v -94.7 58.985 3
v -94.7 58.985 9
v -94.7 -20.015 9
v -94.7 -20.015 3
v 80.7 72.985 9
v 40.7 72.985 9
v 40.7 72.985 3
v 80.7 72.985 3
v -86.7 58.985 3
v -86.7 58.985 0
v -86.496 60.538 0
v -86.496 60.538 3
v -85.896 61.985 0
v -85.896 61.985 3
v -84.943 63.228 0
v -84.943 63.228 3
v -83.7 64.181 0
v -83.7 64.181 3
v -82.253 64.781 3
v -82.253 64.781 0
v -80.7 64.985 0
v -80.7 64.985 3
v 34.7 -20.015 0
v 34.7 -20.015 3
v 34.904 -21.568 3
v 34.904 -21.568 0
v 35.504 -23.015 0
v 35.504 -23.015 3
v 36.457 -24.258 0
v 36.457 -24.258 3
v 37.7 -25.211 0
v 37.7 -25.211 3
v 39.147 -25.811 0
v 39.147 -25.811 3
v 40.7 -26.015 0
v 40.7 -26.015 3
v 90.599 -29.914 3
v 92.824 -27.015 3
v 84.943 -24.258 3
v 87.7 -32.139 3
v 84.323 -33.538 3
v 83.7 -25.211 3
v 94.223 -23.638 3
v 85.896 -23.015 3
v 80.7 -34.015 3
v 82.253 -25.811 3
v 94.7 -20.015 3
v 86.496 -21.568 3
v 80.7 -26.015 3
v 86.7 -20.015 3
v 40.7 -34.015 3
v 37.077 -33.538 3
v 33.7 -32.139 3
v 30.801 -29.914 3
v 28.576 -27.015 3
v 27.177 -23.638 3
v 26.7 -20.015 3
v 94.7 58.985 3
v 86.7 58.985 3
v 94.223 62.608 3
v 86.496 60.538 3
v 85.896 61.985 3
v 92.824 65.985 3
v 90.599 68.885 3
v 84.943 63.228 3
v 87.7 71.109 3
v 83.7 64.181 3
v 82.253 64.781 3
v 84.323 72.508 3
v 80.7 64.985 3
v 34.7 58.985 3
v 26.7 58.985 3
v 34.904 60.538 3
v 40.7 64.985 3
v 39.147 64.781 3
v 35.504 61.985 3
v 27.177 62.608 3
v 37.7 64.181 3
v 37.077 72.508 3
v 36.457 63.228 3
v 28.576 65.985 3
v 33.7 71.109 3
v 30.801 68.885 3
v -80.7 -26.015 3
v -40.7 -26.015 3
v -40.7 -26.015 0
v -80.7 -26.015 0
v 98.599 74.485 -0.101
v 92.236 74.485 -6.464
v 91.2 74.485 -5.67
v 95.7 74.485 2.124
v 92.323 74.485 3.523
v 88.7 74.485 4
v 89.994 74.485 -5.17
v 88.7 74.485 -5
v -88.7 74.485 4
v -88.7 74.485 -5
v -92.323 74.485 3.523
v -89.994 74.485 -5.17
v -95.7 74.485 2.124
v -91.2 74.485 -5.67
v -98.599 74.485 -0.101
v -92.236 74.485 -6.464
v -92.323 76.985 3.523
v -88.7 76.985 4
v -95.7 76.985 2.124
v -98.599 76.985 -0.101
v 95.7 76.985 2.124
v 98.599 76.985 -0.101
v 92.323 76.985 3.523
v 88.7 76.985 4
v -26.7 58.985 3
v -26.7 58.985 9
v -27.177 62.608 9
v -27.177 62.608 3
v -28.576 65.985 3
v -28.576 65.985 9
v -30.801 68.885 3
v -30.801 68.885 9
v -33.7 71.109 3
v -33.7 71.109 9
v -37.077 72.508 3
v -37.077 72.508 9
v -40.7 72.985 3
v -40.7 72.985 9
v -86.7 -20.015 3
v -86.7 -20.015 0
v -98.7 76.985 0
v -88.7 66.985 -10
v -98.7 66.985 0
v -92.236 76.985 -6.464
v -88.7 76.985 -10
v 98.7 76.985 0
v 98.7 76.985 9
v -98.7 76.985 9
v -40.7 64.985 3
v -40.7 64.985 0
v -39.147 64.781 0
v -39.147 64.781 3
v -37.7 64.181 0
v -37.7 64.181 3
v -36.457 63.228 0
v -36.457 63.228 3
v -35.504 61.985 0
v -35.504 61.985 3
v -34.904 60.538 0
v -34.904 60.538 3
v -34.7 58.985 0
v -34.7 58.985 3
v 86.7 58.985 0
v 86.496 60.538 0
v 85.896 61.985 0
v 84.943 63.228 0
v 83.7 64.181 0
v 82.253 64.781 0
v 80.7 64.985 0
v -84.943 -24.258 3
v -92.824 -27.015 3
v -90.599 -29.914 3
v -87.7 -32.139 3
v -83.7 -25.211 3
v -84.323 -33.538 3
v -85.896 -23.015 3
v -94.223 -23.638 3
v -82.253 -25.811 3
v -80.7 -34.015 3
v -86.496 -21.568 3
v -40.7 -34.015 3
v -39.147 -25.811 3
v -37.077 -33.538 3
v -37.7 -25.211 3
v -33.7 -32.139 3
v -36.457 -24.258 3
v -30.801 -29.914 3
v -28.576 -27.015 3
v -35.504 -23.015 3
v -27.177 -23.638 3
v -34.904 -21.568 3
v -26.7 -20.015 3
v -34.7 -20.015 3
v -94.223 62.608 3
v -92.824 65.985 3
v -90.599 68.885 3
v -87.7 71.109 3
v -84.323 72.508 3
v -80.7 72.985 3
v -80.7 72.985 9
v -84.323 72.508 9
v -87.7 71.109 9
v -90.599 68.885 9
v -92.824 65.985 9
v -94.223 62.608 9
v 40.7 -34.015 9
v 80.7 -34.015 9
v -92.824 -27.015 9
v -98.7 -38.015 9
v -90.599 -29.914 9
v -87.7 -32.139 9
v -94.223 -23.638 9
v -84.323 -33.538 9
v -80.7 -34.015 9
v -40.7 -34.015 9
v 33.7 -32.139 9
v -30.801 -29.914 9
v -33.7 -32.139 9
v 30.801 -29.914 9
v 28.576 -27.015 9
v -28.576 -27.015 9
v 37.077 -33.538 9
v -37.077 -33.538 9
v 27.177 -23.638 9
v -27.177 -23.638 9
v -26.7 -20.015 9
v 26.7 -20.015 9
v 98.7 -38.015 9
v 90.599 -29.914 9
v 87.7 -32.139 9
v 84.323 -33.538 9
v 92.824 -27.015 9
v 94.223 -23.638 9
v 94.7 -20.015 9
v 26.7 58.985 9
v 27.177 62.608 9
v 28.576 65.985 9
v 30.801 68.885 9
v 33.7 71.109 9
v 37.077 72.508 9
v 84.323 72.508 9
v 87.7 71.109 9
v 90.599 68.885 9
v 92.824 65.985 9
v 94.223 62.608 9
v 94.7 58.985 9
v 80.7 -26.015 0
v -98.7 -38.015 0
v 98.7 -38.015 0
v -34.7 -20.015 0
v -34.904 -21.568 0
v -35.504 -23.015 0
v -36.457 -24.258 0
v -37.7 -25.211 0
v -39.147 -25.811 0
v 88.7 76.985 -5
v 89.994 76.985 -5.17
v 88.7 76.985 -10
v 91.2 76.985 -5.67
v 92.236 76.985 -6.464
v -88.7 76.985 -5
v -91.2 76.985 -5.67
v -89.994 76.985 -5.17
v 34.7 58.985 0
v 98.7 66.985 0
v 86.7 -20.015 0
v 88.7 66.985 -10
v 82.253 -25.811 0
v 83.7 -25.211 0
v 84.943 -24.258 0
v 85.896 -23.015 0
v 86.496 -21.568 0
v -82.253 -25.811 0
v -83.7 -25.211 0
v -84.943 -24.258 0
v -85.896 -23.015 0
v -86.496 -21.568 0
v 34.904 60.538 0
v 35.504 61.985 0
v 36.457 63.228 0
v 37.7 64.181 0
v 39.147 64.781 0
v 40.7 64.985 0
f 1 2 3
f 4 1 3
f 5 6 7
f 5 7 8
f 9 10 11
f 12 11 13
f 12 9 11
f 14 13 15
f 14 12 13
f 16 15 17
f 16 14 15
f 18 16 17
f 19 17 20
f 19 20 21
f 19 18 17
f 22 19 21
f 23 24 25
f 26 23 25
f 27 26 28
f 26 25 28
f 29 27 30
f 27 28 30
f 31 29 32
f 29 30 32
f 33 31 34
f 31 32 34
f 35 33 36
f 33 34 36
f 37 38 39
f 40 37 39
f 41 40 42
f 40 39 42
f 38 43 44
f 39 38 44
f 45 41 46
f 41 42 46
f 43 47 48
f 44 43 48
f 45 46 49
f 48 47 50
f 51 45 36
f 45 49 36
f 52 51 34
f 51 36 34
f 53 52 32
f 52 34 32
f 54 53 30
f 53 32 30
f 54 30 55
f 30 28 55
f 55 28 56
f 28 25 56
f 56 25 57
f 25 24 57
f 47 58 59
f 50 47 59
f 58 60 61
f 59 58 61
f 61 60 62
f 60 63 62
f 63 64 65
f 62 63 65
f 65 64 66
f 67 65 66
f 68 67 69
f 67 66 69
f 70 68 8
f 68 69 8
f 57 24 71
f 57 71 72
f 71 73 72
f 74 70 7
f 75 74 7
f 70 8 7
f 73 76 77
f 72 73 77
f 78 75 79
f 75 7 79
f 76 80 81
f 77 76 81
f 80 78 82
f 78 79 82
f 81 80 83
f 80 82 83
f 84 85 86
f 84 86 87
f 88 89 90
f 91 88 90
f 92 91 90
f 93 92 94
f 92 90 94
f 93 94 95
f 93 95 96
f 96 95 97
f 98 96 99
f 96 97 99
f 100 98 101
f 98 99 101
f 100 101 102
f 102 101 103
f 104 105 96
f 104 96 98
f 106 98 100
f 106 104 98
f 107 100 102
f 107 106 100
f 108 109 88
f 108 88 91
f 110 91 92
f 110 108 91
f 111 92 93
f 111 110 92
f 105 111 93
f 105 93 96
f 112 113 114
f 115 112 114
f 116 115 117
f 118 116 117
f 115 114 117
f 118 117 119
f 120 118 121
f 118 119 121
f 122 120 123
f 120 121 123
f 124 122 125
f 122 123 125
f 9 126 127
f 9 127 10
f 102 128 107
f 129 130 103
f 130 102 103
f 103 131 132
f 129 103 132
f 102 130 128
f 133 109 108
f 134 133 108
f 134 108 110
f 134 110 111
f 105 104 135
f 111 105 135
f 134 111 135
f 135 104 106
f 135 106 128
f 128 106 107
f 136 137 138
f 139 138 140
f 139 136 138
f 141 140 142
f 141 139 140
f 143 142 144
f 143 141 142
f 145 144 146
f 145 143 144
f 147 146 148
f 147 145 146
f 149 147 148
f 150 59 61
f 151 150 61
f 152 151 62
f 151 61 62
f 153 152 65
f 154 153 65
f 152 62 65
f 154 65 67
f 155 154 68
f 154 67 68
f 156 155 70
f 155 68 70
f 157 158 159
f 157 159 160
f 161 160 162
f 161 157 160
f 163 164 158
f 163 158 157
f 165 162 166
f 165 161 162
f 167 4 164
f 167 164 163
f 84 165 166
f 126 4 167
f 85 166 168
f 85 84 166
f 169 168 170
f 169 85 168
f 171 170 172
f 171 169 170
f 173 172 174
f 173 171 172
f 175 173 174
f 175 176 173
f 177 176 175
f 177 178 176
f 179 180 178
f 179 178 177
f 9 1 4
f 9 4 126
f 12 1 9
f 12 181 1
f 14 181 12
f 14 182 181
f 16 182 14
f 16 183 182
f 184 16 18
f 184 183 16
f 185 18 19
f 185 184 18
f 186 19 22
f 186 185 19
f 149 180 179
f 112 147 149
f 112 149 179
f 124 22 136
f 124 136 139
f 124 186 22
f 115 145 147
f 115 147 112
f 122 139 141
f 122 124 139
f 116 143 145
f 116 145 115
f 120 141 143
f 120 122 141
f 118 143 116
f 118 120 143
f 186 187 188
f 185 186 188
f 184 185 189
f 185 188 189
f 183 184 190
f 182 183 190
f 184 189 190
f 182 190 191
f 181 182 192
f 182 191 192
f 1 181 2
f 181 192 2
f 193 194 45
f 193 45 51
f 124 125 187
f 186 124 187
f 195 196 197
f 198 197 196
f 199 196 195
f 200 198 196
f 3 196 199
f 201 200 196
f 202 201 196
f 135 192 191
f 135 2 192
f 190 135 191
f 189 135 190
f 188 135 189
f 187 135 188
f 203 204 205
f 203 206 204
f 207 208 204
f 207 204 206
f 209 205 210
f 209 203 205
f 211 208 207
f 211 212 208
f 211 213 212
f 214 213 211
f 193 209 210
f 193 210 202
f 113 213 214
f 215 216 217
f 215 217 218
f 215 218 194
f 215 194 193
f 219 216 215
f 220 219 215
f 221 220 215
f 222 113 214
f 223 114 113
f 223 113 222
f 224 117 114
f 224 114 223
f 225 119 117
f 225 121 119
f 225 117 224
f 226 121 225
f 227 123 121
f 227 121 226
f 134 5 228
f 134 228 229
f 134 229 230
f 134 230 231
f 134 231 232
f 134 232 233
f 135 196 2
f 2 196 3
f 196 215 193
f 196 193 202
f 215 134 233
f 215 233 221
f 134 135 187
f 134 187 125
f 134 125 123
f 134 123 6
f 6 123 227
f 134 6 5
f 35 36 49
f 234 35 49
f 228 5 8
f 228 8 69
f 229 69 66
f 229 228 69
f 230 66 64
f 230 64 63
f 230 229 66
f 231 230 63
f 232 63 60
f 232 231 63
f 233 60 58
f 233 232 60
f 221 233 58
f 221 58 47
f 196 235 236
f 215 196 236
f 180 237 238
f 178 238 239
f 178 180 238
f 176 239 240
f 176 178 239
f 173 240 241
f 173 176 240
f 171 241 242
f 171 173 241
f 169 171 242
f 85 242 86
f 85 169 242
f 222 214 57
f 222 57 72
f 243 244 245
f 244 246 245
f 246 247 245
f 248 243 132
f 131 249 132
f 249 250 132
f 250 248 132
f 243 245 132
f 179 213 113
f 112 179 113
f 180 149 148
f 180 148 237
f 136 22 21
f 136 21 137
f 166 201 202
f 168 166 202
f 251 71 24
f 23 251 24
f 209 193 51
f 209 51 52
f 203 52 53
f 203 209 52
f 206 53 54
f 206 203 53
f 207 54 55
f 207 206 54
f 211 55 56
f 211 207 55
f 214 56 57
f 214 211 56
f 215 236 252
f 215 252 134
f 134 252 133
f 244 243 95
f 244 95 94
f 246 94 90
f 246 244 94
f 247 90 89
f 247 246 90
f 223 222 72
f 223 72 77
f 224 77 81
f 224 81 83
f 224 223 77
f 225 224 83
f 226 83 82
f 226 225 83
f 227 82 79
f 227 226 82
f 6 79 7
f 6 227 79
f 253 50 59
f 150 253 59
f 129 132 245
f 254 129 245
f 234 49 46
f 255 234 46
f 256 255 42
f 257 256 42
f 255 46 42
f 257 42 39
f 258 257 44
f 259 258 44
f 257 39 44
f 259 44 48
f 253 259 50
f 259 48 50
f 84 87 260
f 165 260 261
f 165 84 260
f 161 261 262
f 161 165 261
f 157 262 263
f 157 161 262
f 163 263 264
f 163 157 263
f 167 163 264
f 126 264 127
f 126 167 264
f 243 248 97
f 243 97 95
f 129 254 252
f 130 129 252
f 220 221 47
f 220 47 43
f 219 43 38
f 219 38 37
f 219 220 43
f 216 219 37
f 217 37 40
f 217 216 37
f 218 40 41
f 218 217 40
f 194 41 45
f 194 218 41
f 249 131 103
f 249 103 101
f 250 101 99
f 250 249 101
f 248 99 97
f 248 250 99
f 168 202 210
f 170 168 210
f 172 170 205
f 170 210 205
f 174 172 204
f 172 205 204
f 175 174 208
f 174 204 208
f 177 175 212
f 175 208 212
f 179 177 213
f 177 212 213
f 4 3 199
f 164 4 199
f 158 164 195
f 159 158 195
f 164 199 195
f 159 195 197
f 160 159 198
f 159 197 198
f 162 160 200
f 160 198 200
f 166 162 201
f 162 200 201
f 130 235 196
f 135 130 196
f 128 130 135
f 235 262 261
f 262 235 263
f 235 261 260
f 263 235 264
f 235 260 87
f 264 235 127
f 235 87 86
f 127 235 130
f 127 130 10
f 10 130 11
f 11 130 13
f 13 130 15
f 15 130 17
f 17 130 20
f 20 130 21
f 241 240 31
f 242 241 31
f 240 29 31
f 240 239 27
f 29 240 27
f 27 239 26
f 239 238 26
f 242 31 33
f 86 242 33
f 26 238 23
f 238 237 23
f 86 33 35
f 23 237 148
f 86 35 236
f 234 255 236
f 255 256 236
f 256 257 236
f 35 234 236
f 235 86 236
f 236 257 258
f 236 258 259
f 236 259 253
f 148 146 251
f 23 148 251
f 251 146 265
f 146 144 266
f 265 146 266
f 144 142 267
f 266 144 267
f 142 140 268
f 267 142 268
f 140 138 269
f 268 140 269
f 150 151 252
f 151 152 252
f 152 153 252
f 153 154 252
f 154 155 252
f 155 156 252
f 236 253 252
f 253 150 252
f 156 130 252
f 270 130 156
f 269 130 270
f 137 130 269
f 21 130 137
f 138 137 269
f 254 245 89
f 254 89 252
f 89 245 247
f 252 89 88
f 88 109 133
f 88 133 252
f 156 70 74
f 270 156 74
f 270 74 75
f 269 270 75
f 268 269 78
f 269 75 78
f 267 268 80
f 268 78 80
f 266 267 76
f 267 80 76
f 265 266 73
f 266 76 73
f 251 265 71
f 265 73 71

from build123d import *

# Parameters (mm, degrees)
SKETCH1_W           = 197.4
SKETCH1_H           = 115
BOSS_EXTRUDE1_DEPTH = 9
BOSS_EXTRUDE2_DEPTH = 10
CUT_EXTRUDE1_DEPTH  = 9
CUT_EXTRUDE2_DEPTH  = 6
CUT_EXTRUDE3_DEPTH  = 2.5


with BuildPart() as part:
    # Sketch1 → Boss-Extrude1 (new body)
    with BuildSketch(Plane.XY):
        with Locations((0, 19.485033023)):
            Rectangle(SKETCH1_W, SKETCH1_H)
    extrude(amount=BOSS_EXTRUDE1_DEPTH)

    # Sketch2 → Boss-Extrude2 (add)
    with BuildSketch(Plane(origin=(0, 76.985033023, 0), x_dir=(1, 0, 0), z_dir=(0, 1, 0))):
        Polygon((-88.7, 10), (88.7, 10), (98.7, 0), (-98.7, 0), align=None)
    extrude(amount=-BOSS_EXTRUDE2_DEPTH)

    # Sketch3 → Cut-Extrude1 (cut)
    with BuildSketch(Plane.XY.offset(9)):
        with BuildLine():
            Line((-80.7, 64.985033023), (-40.7, 64.985033023))
            ThreePointArc((-40.7, 64.985033023), (-36.457359313, 63.22767371), (-34.7, 58.985033023))
            Line((-34.7, 58.985033023), (-34.7, -20.014966977))
            ThreePointArc((-34.7, -20.014966977), (-36.457359313, -24.257607664), (-40.7, -26.014966977))
            Line((-40.7, -26.014966977), (-80.7, -26.014966977))
            ThreePointArc((-80.7, -26.014966977), (-84.942640687, -24.257607664), (-86.7, -20.014966977))
            Line((-86.7, -20.014966977), (-86.7, 58.985033023))
            ThreePointArc((-86.7, 58.985033023), (-84.942640687, 63.22767371), (-80.7, 64.985033023))
        make_face()
    cut_extrude1 = extrude(amount=-CUT_EXTRUDE1_DEPTH, mode=Mode.SUBTRACT)

    # Sketch4 → Cut-Extrude2 (cut)
    with BuildSketch(Plane.XY.offset(9)):
        with BuildLine():
            Line((-94.7, 58.985033023), (-94.7, -20.014966977))
            ThreePointArc((-94.7, -20.014966977), (-90.599494937, -29.914461914), (-80.7, -34.014966977))
            Line((-80.7, -34.014966977), (-40.7, -34.014966977))
            ThreePointArc((-40.7, -34.014966977), (-30.800505063, -29.914461914), (-26.7, -20.014966977))
            Line((-26.7, -20.014966977), (-26.7, 58.985033023))
            ThreePointArc((-26.7, 58.985033023), (-30.800505063, 68.88452796), (-40.7, 72.985033023))
            Line((-40.7, 72.985033023), (-80.7, 72.985033023))
            ThreePointArc((-80.7, 72.985033023), (-90.599494937, 68.88452796), (-94.7, 58.985033023))
        make_face()
    cut_extrude2 = extrude(amount=-CUT_EXTRUDE2_DEPTH, mode=Mode.SUBTRACT)

    # Mirror1: Cut-Extrude1, Cut-Extrude2 across plane
    add(cut_extrude1.mirror(Plane(origin=(0, 0, 0), x_dir=(0, 0, 1), z_dir=(1, 0, 0))), mode=Mode.SUBTRACT)
    add(cut_extrude2.mirror(Plane(origin=(0, 0, 0), x_dir=(0, 0, 1), z_dir=(1, 0, 0))), mode=Mode.SUBTRACT)

    # Sketch5 → Cut-Extrude3 (cut)
    with BuildSketch(Plane(origin=(0, 76.985033023, 0), x_dir=(1, 0, 0), z_dir=(0, 1, 0))):
        with BuildLine():
            Line((-88.7, 5), (88.7, 5))
            ThreePointArc((88.7, 5), (90.613417162, 5.380602337), (92.235533906, 6.464466094))
            Line((92.235533906, 6.464466094), (98.599494937, 0.100505063))
            ThreePointArc((98.599494937, 0.100505063), (94.057568053, -2.934313455), (88.7, -4))
            Line((88.7, -4), (-88.7, -4))
            ThreePointArc((-88.7, -4), (-94.057568053, -2.934313455), (-98.599494937, 0.100505063))
            Line((-98.599494937, 0.100505063), (-92.235533906, 6.464466094))
            ThreePointArc((-92.235533906, 6.464466094), (-90.613417162, 5.380602337), (-88.7, 5))
        make_face()
    extrude(amount=-CUT_EXTRUDE3_DEPTH, mode=Mode.SUBTRACT)


solid = part.part
